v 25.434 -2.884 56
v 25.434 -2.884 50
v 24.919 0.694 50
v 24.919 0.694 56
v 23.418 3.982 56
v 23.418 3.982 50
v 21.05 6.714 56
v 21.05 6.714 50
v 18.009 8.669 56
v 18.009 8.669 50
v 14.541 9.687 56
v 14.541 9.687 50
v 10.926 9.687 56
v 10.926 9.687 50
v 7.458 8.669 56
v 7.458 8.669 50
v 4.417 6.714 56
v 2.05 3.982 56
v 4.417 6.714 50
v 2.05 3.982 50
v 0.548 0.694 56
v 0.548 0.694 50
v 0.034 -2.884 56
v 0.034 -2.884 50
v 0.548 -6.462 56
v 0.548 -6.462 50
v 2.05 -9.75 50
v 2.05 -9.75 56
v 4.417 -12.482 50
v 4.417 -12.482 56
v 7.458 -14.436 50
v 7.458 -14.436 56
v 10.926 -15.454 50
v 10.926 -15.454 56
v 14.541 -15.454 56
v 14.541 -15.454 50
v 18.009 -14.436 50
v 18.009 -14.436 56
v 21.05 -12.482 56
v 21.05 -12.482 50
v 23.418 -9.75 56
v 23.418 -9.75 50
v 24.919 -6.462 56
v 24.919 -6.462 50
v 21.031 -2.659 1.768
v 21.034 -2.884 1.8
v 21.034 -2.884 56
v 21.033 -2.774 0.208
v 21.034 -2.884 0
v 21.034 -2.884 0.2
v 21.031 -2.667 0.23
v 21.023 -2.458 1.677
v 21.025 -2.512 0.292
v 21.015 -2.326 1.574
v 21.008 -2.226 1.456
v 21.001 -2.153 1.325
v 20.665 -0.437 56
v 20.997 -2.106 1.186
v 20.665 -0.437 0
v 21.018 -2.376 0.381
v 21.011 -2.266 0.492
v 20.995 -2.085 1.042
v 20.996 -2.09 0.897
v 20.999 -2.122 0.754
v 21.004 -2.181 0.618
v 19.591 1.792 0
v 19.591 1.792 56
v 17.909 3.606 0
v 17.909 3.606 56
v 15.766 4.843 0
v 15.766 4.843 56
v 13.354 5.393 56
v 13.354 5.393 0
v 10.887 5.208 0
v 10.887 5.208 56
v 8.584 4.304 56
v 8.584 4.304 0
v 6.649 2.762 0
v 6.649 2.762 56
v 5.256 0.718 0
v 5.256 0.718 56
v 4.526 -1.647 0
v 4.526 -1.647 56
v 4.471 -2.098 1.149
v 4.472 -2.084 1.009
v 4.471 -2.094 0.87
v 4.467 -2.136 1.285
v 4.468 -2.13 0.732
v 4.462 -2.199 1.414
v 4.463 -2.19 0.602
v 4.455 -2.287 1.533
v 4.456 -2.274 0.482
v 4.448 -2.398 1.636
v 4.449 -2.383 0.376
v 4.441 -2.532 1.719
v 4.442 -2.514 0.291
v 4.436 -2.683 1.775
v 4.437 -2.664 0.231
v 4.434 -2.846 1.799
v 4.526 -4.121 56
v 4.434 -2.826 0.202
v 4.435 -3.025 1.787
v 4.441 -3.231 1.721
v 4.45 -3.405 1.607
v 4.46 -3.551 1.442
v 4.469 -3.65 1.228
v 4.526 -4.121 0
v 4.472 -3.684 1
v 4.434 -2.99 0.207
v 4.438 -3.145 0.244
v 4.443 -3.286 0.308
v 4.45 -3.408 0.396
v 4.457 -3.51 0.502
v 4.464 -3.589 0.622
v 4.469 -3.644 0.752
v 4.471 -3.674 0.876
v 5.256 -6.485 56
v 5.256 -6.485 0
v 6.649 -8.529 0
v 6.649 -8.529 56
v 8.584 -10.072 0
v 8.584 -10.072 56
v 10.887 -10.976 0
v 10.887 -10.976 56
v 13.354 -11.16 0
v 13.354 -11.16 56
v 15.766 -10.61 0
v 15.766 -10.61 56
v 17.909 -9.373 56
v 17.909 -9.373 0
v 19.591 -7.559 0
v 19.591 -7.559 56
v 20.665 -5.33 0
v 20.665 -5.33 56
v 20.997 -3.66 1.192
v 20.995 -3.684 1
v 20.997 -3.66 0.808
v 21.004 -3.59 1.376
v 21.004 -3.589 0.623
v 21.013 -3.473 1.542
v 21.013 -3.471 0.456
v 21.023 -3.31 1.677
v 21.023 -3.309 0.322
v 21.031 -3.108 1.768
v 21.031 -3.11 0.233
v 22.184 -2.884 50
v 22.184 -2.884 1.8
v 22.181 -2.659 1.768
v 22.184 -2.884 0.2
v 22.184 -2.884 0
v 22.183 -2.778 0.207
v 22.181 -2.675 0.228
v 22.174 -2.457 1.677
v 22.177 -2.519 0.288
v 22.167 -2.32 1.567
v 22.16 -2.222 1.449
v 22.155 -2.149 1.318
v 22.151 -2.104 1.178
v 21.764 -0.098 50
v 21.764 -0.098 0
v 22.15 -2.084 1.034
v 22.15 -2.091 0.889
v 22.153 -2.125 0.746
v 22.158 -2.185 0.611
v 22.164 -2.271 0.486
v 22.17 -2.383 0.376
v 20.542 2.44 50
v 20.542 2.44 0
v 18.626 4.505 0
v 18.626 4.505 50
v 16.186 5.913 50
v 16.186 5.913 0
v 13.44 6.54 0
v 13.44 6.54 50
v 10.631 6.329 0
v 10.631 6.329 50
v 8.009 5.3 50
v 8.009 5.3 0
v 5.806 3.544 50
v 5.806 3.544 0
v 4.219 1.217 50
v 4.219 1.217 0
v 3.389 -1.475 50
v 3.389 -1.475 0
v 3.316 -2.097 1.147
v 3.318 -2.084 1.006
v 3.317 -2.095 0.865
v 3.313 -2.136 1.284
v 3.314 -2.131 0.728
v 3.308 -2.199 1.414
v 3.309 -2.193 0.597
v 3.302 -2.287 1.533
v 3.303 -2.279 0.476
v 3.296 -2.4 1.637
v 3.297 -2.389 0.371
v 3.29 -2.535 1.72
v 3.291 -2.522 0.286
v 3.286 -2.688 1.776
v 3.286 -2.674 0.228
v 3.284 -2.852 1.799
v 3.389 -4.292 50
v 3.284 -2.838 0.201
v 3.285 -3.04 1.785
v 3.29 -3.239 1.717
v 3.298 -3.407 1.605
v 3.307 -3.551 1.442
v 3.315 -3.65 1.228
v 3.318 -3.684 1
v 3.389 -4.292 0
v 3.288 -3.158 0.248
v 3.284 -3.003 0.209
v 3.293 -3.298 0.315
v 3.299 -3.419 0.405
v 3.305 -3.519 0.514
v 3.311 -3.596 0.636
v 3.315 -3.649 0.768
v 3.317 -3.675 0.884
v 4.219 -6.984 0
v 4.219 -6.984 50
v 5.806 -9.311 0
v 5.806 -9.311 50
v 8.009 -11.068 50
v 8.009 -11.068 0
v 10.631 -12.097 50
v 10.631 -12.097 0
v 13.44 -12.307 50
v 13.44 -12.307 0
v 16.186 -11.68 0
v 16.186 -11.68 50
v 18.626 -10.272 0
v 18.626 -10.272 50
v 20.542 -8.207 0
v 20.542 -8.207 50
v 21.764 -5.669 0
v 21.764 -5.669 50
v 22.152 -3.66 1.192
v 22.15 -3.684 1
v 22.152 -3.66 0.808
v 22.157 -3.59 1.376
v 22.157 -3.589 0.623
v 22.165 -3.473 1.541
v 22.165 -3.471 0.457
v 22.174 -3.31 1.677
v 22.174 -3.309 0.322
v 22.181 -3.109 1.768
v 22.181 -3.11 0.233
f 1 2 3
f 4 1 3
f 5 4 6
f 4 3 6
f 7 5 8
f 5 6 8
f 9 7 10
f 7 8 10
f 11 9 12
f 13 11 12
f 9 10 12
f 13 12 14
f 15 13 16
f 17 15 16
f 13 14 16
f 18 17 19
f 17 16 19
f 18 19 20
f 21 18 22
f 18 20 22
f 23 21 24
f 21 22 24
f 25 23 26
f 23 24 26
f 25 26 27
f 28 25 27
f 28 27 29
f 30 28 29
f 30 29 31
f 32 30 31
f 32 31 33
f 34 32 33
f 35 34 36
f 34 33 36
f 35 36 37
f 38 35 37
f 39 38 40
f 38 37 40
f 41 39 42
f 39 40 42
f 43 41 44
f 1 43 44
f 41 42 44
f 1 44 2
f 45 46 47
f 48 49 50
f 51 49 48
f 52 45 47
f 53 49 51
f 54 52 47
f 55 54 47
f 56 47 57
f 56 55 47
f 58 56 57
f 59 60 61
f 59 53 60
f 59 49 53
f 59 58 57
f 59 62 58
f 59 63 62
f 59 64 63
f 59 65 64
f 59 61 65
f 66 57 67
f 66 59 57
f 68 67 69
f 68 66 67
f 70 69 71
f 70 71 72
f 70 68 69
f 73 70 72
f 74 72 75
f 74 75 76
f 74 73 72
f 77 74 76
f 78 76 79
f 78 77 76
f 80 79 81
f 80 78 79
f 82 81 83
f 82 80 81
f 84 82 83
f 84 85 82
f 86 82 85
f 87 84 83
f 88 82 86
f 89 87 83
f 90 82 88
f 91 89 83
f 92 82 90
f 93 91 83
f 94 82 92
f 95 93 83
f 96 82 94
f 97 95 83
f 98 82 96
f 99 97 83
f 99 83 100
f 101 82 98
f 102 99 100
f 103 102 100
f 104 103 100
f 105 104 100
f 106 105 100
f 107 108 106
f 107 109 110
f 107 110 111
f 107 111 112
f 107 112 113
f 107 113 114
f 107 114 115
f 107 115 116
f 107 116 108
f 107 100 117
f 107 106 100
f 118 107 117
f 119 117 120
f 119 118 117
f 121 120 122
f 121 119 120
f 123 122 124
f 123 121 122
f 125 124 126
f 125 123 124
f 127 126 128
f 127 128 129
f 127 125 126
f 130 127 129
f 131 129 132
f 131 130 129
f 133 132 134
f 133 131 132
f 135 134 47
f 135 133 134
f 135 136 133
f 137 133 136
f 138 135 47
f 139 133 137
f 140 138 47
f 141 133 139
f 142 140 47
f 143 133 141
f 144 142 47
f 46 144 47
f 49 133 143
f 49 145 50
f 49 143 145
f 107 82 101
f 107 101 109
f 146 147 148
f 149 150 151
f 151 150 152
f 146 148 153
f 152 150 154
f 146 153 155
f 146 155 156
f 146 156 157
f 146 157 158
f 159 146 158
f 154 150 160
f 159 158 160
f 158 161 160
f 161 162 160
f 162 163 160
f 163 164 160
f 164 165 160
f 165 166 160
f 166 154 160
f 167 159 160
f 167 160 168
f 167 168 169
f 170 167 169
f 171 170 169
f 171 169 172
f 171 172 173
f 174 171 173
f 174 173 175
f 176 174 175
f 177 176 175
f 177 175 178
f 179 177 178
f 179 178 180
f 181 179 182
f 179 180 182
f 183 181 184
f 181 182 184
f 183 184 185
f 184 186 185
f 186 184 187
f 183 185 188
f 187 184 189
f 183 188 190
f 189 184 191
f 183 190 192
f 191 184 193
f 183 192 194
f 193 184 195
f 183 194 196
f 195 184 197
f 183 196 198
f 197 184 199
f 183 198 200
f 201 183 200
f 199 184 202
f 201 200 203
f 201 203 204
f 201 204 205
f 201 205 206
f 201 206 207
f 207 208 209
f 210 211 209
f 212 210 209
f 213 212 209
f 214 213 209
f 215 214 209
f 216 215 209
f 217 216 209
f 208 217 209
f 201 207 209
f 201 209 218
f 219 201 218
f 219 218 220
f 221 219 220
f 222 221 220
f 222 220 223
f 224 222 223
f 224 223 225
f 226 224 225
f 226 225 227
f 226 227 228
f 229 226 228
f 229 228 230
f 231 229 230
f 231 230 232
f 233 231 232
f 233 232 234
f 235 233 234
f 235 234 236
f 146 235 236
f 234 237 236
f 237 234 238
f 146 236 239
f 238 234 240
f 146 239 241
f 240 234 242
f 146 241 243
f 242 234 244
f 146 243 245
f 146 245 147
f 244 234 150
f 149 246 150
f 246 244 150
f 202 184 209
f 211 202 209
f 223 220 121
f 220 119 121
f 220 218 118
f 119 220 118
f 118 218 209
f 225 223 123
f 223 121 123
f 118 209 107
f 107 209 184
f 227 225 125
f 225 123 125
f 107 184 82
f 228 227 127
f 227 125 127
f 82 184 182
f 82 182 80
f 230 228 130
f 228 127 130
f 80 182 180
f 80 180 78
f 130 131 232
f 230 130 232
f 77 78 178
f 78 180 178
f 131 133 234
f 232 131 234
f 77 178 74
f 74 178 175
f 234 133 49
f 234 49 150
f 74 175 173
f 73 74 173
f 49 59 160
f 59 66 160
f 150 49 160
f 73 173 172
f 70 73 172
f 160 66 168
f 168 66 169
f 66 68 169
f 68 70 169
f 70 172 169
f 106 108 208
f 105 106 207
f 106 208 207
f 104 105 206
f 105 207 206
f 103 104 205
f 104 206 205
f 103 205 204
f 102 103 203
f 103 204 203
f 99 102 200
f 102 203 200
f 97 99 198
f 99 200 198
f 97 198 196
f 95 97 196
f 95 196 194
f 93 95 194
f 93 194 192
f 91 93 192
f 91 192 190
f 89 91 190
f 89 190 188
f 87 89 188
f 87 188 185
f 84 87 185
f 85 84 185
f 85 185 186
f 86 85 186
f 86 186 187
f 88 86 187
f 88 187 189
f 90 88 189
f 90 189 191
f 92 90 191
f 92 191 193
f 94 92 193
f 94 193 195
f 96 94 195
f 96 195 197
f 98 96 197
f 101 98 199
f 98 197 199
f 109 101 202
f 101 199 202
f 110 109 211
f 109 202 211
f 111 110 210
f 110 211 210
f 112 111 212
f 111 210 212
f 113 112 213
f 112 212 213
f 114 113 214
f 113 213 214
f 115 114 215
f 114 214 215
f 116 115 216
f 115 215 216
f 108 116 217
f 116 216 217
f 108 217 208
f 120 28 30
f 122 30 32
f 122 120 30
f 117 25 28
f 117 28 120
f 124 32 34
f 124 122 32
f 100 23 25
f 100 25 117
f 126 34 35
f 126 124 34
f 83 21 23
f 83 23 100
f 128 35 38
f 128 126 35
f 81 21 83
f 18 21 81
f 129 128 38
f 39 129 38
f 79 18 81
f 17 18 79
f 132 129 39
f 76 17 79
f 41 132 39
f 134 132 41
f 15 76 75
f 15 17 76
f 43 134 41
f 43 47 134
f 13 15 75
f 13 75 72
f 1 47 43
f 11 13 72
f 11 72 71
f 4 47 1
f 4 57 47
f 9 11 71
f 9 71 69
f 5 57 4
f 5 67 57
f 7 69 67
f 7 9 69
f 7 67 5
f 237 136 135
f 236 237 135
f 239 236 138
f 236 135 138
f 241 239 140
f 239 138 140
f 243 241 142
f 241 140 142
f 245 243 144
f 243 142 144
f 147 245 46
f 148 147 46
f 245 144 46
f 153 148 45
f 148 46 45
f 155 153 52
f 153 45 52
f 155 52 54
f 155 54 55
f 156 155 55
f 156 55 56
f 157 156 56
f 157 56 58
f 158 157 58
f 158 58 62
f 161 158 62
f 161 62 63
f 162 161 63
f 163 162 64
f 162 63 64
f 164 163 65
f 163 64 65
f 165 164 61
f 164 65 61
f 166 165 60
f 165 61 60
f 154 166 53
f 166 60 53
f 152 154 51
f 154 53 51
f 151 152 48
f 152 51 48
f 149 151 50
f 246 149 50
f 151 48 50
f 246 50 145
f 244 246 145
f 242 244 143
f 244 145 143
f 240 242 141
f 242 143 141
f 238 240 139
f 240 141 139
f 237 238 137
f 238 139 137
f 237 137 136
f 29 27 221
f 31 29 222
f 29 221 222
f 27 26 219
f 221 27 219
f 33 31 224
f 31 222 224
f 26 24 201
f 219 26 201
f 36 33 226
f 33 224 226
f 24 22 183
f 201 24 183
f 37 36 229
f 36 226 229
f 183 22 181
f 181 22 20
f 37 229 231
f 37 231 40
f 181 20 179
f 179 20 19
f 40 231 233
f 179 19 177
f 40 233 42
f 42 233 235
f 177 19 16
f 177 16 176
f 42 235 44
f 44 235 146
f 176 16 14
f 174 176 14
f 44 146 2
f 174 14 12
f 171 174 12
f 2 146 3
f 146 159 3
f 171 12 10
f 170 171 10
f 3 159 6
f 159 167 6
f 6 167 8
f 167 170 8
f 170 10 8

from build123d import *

# Parameters (mm, degrees)
SKETCH1_R             = 9.45
SKETCH1_R_2           = 8.3
BOSS_EXTRUDE1_DEPTH   = 50
SKETCH2_R             = 12.7
SKETCH2_R_2           = 8.3
BOSS_EXTRUDE2_DEPTH   = 6
M2X0_4_TAPPED_HOLE1_D = 1.6


with BuildPart() as part:
    # Sketch1 → Boss-Extrude1 (new body)
    with BuildSketch(Plane.XY):
        with Locations((12.733633013, -2.883668241)):
            Circle(SKETCH1_R)
        with Locations((12.733633013, -2.883668241)):
            Circle(SKETCH1_R_2, mode=Mode.SUBTRACT)
    extrude(amount=BOSS_EXTRUDE1_DEPTH)

    # Sketch2 → Boss-Extrude2 (add)
    with BuildSketch(Plane.XY.offset(50)):
        with Locations((12.733633013, -2.883668241)):
            Circle(SKETCH2_R)
        with Locations((12.733633013, -2.883668241)):
            Circle(SKETCH2_R_2, mode=Mode.SUBTRACT)
    extrude(amount=BOSS_EXTRUDE2_DEPTH)

    # M2x0.4 Tapped Hole1 (through all)
    with Locations(Plane(origin=(22.183633013, -2.883668241, 1), x_dir=(0, 1, 0), z_dir=(1, 0, 0))):
        with Locations((0, 0)):
            Hole(M2X0_4_TAPPED_HOLE1_D / 2)


solid = part.part
